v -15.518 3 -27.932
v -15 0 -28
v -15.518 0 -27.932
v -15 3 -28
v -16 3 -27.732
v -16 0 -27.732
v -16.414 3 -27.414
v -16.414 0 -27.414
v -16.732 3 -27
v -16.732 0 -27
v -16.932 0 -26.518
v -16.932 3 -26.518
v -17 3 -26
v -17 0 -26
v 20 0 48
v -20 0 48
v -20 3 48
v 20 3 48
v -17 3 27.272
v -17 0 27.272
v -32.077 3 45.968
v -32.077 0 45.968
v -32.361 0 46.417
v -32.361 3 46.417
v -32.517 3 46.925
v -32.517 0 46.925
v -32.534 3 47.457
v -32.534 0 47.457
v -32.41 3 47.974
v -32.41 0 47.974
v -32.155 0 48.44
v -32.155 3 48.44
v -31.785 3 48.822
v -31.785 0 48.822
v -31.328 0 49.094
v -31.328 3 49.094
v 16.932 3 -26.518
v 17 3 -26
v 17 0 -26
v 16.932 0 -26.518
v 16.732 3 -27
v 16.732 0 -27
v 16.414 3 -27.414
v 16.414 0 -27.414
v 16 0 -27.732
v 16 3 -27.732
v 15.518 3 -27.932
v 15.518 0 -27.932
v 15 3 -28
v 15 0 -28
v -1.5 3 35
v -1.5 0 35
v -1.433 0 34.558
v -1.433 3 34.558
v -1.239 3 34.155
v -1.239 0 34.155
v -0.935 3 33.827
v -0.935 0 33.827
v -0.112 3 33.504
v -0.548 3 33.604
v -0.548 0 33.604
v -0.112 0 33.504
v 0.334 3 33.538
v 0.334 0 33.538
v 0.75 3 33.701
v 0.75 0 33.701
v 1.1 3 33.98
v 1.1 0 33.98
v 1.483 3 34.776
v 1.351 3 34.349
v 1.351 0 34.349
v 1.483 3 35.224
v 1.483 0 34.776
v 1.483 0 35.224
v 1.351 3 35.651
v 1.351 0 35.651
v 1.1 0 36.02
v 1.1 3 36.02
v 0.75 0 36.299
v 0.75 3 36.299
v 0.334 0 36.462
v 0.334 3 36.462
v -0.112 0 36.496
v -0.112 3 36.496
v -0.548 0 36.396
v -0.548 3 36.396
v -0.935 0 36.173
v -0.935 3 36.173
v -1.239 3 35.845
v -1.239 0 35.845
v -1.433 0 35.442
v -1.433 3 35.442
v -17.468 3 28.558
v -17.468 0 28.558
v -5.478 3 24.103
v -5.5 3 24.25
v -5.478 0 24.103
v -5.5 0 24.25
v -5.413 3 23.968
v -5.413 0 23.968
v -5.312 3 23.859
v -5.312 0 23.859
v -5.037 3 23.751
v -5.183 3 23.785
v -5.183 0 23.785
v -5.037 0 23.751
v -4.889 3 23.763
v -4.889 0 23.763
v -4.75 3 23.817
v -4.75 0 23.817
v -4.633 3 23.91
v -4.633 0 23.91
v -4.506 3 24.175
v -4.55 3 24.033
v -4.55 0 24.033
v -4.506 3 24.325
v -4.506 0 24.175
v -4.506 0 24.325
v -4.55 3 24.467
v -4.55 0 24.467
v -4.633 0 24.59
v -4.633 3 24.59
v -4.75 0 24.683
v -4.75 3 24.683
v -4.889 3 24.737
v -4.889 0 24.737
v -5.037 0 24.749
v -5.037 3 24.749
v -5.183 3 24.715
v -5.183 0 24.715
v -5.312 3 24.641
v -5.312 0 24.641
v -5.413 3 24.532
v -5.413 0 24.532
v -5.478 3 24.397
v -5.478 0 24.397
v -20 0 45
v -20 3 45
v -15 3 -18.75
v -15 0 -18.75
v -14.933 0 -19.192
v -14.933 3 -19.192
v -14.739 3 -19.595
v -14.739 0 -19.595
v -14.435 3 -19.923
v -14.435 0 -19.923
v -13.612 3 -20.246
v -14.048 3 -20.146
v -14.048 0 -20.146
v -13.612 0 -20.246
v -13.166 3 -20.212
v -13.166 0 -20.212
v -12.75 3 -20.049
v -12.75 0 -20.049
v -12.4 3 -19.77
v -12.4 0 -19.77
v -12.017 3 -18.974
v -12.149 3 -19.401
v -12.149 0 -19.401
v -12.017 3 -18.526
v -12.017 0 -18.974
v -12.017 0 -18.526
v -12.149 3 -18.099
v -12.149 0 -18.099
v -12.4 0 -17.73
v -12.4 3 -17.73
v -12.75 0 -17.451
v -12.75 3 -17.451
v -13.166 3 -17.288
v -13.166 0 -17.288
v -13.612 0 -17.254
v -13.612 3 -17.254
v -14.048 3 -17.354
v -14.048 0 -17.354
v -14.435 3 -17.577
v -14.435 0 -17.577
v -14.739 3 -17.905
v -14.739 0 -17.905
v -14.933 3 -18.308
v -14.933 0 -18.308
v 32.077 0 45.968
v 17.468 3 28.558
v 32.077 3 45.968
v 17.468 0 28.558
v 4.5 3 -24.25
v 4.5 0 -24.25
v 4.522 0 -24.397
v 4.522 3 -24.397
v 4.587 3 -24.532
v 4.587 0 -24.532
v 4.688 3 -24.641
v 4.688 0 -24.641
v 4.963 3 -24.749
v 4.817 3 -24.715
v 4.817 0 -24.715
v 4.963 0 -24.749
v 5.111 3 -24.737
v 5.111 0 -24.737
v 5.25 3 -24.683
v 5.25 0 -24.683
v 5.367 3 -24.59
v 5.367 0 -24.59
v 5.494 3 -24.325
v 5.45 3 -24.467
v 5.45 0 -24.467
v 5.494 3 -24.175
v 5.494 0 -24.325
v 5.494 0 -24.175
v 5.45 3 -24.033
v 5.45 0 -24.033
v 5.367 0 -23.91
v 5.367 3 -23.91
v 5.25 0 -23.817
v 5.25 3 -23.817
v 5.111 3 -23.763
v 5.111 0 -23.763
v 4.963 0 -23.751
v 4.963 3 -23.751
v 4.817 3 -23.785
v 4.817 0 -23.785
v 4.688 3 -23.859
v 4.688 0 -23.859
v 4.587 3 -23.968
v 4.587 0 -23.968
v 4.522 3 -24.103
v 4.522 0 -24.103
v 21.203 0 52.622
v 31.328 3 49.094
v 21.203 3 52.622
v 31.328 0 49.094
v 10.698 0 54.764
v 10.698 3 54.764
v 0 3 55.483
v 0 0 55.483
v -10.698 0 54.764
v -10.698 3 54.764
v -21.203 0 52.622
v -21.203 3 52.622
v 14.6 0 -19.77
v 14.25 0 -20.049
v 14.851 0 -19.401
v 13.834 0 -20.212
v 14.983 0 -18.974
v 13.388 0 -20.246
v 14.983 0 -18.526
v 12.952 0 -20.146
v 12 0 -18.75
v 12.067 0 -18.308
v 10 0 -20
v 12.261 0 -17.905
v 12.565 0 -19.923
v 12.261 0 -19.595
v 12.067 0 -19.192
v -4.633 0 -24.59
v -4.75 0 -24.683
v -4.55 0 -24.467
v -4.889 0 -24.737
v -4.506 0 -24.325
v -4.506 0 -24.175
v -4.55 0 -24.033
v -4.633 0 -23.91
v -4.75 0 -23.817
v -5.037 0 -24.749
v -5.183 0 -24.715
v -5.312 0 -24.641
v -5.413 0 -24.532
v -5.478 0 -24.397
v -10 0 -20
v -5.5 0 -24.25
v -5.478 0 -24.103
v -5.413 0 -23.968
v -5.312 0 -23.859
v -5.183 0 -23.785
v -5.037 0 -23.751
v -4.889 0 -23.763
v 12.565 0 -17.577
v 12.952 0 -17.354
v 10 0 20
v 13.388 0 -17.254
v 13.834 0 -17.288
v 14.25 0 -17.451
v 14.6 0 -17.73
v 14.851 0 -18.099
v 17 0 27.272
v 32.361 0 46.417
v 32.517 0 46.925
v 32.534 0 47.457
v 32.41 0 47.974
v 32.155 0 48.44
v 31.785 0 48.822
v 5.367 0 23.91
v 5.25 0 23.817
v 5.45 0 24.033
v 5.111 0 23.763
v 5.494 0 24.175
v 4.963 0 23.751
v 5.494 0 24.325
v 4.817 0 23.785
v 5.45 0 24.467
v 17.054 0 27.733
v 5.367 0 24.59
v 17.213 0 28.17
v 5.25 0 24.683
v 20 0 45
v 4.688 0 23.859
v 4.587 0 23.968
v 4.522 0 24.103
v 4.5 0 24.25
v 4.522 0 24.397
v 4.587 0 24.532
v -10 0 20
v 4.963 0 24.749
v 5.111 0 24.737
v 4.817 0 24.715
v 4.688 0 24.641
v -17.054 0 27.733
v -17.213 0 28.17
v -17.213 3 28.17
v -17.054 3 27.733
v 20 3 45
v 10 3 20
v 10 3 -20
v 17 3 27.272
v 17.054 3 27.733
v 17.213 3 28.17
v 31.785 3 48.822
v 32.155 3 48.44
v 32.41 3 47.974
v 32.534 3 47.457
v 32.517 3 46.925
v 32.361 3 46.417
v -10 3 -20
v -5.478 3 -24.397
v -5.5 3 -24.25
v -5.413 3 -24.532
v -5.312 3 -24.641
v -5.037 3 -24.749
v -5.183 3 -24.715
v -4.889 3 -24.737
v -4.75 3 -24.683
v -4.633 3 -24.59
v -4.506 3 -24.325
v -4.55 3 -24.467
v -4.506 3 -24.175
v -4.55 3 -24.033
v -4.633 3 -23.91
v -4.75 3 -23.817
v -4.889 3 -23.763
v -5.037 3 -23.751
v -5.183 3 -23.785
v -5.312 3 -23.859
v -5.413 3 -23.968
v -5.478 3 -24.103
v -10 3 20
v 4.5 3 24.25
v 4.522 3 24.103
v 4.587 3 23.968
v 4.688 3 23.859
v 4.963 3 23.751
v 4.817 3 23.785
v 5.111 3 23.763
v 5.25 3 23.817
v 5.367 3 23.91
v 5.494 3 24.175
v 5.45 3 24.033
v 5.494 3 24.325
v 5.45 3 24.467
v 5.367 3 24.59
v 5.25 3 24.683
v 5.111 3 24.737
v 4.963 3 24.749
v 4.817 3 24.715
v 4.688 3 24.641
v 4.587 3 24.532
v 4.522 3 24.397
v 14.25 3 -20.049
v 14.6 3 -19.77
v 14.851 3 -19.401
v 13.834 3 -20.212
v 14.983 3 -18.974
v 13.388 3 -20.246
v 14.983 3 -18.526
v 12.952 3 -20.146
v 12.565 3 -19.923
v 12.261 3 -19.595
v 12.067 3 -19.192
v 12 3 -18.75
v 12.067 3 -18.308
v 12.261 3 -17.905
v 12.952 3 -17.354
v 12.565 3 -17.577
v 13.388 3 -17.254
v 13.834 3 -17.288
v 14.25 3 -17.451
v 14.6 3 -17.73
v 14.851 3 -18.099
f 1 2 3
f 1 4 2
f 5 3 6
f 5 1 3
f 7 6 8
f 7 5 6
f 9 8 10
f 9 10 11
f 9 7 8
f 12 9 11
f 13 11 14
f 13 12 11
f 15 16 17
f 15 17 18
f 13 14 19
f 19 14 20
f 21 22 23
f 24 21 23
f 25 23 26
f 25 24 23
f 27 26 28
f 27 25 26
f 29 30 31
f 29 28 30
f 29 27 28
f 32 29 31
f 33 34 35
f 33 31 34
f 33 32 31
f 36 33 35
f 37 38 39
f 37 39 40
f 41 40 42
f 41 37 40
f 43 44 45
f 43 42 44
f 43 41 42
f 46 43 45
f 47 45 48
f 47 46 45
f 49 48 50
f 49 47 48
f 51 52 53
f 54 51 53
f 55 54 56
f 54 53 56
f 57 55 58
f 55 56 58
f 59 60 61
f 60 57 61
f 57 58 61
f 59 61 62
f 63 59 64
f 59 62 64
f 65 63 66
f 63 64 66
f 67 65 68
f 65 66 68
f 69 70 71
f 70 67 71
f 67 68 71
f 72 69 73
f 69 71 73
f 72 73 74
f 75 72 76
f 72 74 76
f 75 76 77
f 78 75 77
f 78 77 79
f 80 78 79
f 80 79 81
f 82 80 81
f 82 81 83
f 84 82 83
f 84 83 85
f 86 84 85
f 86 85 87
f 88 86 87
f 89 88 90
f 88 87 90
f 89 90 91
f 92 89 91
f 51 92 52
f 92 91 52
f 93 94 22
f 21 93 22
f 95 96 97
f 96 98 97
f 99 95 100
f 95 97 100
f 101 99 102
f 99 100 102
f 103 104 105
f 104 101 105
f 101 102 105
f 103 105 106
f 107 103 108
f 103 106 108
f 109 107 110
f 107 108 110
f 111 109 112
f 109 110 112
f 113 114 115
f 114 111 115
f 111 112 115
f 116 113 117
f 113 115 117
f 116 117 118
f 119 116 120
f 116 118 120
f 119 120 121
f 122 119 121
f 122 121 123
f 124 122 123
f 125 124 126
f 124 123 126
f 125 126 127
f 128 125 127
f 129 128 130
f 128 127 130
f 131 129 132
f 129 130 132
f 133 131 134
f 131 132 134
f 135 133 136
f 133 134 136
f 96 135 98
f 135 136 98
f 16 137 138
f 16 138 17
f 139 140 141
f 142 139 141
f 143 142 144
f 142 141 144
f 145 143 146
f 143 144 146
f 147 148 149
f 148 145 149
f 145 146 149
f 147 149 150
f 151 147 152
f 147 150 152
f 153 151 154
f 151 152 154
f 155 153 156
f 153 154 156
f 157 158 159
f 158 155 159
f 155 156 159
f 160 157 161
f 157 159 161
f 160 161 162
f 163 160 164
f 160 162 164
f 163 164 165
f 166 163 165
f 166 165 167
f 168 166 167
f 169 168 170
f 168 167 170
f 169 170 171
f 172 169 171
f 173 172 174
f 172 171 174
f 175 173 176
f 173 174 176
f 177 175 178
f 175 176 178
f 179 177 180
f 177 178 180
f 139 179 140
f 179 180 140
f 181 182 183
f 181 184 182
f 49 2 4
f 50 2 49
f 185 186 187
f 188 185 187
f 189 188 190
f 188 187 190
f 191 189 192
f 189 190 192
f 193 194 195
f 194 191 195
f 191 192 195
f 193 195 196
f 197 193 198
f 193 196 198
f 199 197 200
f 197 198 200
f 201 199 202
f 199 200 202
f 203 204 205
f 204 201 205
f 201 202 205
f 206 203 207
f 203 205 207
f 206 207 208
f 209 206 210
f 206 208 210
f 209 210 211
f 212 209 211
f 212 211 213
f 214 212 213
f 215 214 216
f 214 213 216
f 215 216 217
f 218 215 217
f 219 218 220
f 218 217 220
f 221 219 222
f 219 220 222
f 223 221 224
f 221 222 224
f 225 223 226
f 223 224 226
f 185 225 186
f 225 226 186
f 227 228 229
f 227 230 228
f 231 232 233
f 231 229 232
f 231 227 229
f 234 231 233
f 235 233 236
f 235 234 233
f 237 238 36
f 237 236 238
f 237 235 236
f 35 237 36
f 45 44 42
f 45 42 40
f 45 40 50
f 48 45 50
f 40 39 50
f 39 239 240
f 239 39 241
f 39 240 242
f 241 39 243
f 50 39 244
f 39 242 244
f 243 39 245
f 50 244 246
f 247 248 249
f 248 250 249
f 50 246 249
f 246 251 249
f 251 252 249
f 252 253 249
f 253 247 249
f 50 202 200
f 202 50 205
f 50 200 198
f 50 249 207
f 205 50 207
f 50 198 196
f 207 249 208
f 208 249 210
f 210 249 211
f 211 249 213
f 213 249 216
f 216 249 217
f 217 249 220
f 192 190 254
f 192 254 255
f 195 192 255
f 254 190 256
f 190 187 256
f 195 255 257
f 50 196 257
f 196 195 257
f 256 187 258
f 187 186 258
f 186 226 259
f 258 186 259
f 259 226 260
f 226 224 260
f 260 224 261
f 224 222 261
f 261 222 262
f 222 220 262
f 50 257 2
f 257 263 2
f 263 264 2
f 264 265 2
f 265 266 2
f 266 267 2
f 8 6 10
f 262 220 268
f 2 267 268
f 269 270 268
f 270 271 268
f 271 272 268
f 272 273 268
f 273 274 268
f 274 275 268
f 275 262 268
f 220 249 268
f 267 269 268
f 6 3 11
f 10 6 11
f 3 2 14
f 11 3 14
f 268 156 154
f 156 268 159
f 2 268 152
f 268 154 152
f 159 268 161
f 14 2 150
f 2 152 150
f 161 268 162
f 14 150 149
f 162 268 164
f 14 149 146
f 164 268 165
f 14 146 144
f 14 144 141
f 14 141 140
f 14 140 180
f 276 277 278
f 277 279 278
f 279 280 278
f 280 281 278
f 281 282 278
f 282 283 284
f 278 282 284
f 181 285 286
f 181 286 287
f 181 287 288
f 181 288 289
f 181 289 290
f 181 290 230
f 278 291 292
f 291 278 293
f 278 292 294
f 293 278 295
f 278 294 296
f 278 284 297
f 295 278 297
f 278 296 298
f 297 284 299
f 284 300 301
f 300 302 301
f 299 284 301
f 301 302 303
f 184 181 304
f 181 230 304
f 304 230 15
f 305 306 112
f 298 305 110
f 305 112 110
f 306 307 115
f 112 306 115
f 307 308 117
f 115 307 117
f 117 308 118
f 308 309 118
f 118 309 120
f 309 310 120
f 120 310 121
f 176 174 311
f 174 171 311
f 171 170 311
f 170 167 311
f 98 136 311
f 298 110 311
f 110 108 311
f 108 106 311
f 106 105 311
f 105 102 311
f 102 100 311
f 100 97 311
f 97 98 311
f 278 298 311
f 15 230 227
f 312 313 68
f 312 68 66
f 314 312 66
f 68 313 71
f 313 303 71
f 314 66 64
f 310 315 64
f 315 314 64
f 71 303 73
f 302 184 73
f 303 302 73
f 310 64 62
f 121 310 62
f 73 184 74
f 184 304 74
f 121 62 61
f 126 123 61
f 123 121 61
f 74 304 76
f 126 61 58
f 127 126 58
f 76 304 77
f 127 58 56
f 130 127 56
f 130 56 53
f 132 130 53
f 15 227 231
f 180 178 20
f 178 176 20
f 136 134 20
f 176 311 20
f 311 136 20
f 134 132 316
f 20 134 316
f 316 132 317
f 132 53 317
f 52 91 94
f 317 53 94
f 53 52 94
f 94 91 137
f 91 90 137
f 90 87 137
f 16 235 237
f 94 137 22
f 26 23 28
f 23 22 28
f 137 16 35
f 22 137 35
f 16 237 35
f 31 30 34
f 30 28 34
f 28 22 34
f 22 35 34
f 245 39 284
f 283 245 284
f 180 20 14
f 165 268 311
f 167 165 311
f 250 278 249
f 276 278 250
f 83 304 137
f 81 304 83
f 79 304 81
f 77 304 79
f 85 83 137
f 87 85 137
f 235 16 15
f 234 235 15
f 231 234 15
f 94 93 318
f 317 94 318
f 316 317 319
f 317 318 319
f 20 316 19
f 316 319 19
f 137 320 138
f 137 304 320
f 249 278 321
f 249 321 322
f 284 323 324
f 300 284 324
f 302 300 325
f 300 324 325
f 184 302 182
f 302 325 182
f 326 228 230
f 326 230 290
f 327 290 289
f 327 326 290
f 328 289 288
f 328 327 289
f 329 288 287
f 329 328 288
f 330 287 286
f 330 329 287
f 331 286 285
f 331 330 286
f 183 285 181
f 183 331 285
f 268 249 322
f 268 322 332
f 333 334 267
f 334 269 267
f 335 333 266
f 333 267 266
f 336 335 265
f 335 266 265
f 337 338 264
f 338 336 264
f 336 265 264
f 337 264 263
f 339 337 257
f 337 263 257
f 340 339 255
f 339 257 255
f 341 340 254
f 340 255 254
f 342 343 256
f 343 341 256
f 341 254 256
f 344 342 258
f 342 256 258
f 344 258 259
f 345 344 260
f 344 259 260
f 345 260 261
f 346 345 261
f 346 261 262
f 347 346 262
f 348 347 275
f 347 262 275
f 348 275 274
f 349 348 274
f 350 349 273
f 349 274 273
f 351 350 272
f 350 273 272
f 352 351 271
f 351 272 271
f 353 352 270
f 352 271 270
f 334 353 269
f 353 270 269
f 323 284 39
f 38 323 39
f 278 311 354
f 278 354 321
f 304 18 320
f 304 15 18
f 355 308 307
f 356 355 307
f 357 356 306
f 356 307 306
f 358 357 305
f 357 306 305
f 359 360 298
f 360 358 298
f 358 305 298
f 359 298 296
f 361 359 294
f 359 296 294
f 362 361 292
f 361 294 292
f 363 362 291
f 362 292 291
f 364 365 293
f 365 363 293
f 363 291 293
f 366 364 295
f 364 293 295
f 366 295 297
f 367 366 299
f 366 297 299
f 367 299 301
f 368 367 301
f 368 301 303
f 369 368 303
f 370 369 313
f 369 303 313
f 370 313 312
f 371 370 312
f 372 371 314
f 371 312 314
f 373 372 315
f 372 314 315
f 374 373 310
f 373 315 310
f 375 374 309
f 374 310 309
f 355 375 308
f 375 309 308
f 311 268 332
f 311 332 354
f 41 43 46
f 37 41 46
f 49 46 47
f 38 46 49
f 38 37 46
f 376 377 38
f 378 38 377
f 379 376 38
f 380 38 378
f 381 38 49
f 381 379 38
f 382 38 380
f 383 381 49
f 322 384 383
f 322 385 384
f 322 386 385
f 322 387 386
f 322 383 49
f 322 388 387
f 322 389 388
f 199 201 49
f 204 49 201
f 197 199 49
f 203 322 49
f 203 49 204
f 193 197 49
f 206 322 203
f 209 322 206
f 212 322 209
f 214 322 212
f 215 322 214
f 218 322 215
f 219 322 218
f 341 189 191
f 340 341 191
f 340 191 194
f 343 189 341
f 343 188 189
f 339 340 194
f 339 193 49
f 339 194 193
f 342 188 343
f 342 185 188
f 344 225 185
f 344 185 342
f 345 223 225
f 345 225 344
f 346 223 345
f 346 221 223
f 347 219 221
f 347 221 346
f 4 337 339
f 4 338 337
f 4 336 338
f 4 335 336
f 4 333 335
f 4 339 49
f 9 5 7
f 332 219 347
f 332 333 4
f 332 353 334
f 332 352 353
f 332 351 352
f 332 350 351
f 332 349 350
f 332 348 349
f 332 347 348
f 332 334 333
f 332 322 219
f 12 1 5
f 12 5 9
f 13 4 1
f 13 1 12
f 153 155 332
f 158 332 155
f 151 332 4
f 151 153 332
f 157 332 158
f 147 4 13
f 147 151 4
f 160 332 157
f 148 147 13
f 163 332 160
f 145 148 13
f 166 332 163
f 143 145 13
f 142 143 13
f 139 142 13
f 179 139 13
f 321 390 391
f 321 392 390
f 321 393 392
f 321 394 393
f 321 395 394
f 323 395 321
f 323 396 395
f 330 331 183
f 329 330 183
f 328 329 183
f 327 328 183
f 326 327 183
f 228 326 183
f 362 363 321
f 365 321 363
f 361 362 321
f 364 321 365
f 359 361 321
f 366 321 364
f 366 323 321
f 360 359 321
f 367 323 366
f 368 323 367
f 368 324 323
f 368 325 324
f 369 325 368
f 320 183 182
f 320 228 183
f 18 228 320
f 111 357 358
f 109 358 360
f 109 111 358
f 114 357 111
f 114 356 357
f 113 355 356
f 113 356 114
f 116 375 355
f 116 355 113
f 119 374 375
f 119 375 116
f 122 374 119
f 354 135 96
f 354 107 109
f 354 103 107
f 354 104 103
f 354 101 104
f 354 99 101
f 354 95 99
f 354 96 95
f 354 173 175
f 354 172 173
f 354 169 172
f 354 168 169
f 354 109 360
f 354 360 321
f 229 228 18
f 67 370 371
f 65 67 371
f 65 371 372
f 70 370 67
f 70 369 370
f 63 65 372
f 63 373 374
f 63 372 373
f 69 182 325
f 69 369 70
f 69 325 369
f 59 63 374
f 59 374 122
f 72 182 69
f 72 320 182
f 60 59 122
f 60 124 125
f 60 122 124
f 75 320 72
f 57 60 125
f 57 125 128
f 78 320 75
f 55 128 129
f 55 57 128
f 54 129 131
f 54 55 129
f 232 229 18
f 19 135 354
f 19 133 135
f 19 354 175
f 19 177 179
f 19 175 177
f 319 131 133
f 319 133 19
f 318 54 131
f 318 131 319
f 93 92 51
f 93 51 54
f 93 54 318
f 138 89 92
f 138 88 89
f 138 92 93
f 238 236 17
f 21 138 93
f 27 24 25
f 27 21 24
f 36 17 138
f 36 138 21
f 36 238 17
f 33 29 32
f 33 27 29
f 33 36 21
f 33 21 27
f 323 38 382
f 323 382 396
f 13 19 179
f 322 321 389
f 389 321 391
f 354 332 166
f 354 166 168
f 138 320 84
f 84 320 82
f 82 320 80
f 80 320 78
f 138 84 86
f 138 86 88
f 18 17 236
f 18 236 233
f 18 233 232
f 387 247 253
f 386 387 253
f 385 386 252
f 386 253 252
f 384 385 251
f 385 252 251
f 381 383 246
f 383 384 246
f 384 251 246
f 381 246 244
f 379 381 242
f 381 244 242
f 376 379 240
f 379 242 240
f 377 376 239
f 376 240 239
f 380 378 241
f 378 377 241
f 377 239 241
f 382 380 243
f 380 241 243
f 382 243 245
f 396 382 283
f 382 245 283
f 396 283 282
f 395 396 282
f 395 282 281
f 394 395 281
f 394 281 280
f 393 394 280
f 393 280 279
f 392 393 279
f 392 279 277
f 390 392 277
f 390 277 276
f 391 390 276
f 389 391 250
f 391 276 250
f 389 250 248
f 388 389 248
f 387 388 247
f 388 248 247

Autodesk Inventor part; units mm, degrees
ref_plane "YZ Plane" through (0, 0, 0) normal (1, 0, 0) x (0, 1, 0)
ref_plane "XZ Plane" through (0, 0, 0) normal (0, 1, 0) x (-1, 0, 0)
ref_plane "XY Plane" through (0, 0, 0) normal (0, 0, 1) x (1, 0, 0)
sketch "Sketch1" plane through (0, 0, 0) normal (0, 1, 0) x (-1, 0, 0)
  line L0 (46, 0) -> (-35, 0) construction
  line L1 (0, 54.3949) -> (0, -60) construction
  line L2 (10, 20) -> (-10, 20)
  line L3 (-10, 20) -> (-10, -20)
  line L4 (-10, -20) -> (10, -20)
  line L5 (10, -20) -> (10, 20)
  line L6 (17, -28) -> (17, 28)
  circle A0 centre (5, 24.25) radius 0.5
  circle A1 centre (-5, 24.25) radius 0.5
  line L7 (14.6784, 24.25) -> (-18, 24.25) construction
  circle A2 centre (5, -24.25) radius 0.5
  circle A3 centre (-5, -24.25) radius 0.5
  circle A4 centre (13.5, -18.75) radius 1.5
  line L8 (-17, 28) -> (-17, -28)
  line L9 (17, -28) -> (-17, -28)
  line L10 (17, 28) -> (33.782, 48)
  line L11 (17, 28) -> (43.1081, 28) construction
  line L12 (-17, 28) -> (-33.782, 48)
  arc A5 (33.782, 48) -> (-33.782, 48) centre (0, -24.5174) ccw
  line L13 (20, 48) -> (-20, 48)
  line L14 (-20, 48) -> (-20, 45)
  line L15 (-20, 45) -> (20, 45)
  line L16 (20, 45) -> (20, 48)
  circle A6 centre (0, 35) radius 1.5
  circle A7 centre (-13.5, -18.75) radius 1.5
  point P0 (0, 0)
  dimension "d0" = 40
  dimension "d1" = 20
  dimension "d2" = 7
  dimension "d6" = 20
  dimension "d7" = 10
  dimension "d11" = 1
  dimension "d12" = 1
  dimension "d13" = 5
  dimension "d14" = 5
  dimension "d15" = 4.25
  dimension "d16" = 3
  dimension "d29" = 3.5
  dimension "d34" = 8
  dimension "d35" = 50
  dimension "d36" = 20
  dimension "d37" = 56
  dimension "d38" = 80
  dimension "d39" = 40
  dimension "d41" = 3
  dimension "d42" = 25
  dimension "d43" = 9.25
  dimension "d44" = 3
  dimension "d45" = 10
extrude "Extrusion2" add sketch "Sketch1" along normal blind 3
fillet "Fillet2" radius 2 6 edges at (33.782, 1.5, 48) (-33.782, 1.5, 48) (17, 1.5, 28) (-17, 1.5, 28) (-17, 1.5, -28) (17, 1.5, -28)
properties part number "bracket_camera_top"
